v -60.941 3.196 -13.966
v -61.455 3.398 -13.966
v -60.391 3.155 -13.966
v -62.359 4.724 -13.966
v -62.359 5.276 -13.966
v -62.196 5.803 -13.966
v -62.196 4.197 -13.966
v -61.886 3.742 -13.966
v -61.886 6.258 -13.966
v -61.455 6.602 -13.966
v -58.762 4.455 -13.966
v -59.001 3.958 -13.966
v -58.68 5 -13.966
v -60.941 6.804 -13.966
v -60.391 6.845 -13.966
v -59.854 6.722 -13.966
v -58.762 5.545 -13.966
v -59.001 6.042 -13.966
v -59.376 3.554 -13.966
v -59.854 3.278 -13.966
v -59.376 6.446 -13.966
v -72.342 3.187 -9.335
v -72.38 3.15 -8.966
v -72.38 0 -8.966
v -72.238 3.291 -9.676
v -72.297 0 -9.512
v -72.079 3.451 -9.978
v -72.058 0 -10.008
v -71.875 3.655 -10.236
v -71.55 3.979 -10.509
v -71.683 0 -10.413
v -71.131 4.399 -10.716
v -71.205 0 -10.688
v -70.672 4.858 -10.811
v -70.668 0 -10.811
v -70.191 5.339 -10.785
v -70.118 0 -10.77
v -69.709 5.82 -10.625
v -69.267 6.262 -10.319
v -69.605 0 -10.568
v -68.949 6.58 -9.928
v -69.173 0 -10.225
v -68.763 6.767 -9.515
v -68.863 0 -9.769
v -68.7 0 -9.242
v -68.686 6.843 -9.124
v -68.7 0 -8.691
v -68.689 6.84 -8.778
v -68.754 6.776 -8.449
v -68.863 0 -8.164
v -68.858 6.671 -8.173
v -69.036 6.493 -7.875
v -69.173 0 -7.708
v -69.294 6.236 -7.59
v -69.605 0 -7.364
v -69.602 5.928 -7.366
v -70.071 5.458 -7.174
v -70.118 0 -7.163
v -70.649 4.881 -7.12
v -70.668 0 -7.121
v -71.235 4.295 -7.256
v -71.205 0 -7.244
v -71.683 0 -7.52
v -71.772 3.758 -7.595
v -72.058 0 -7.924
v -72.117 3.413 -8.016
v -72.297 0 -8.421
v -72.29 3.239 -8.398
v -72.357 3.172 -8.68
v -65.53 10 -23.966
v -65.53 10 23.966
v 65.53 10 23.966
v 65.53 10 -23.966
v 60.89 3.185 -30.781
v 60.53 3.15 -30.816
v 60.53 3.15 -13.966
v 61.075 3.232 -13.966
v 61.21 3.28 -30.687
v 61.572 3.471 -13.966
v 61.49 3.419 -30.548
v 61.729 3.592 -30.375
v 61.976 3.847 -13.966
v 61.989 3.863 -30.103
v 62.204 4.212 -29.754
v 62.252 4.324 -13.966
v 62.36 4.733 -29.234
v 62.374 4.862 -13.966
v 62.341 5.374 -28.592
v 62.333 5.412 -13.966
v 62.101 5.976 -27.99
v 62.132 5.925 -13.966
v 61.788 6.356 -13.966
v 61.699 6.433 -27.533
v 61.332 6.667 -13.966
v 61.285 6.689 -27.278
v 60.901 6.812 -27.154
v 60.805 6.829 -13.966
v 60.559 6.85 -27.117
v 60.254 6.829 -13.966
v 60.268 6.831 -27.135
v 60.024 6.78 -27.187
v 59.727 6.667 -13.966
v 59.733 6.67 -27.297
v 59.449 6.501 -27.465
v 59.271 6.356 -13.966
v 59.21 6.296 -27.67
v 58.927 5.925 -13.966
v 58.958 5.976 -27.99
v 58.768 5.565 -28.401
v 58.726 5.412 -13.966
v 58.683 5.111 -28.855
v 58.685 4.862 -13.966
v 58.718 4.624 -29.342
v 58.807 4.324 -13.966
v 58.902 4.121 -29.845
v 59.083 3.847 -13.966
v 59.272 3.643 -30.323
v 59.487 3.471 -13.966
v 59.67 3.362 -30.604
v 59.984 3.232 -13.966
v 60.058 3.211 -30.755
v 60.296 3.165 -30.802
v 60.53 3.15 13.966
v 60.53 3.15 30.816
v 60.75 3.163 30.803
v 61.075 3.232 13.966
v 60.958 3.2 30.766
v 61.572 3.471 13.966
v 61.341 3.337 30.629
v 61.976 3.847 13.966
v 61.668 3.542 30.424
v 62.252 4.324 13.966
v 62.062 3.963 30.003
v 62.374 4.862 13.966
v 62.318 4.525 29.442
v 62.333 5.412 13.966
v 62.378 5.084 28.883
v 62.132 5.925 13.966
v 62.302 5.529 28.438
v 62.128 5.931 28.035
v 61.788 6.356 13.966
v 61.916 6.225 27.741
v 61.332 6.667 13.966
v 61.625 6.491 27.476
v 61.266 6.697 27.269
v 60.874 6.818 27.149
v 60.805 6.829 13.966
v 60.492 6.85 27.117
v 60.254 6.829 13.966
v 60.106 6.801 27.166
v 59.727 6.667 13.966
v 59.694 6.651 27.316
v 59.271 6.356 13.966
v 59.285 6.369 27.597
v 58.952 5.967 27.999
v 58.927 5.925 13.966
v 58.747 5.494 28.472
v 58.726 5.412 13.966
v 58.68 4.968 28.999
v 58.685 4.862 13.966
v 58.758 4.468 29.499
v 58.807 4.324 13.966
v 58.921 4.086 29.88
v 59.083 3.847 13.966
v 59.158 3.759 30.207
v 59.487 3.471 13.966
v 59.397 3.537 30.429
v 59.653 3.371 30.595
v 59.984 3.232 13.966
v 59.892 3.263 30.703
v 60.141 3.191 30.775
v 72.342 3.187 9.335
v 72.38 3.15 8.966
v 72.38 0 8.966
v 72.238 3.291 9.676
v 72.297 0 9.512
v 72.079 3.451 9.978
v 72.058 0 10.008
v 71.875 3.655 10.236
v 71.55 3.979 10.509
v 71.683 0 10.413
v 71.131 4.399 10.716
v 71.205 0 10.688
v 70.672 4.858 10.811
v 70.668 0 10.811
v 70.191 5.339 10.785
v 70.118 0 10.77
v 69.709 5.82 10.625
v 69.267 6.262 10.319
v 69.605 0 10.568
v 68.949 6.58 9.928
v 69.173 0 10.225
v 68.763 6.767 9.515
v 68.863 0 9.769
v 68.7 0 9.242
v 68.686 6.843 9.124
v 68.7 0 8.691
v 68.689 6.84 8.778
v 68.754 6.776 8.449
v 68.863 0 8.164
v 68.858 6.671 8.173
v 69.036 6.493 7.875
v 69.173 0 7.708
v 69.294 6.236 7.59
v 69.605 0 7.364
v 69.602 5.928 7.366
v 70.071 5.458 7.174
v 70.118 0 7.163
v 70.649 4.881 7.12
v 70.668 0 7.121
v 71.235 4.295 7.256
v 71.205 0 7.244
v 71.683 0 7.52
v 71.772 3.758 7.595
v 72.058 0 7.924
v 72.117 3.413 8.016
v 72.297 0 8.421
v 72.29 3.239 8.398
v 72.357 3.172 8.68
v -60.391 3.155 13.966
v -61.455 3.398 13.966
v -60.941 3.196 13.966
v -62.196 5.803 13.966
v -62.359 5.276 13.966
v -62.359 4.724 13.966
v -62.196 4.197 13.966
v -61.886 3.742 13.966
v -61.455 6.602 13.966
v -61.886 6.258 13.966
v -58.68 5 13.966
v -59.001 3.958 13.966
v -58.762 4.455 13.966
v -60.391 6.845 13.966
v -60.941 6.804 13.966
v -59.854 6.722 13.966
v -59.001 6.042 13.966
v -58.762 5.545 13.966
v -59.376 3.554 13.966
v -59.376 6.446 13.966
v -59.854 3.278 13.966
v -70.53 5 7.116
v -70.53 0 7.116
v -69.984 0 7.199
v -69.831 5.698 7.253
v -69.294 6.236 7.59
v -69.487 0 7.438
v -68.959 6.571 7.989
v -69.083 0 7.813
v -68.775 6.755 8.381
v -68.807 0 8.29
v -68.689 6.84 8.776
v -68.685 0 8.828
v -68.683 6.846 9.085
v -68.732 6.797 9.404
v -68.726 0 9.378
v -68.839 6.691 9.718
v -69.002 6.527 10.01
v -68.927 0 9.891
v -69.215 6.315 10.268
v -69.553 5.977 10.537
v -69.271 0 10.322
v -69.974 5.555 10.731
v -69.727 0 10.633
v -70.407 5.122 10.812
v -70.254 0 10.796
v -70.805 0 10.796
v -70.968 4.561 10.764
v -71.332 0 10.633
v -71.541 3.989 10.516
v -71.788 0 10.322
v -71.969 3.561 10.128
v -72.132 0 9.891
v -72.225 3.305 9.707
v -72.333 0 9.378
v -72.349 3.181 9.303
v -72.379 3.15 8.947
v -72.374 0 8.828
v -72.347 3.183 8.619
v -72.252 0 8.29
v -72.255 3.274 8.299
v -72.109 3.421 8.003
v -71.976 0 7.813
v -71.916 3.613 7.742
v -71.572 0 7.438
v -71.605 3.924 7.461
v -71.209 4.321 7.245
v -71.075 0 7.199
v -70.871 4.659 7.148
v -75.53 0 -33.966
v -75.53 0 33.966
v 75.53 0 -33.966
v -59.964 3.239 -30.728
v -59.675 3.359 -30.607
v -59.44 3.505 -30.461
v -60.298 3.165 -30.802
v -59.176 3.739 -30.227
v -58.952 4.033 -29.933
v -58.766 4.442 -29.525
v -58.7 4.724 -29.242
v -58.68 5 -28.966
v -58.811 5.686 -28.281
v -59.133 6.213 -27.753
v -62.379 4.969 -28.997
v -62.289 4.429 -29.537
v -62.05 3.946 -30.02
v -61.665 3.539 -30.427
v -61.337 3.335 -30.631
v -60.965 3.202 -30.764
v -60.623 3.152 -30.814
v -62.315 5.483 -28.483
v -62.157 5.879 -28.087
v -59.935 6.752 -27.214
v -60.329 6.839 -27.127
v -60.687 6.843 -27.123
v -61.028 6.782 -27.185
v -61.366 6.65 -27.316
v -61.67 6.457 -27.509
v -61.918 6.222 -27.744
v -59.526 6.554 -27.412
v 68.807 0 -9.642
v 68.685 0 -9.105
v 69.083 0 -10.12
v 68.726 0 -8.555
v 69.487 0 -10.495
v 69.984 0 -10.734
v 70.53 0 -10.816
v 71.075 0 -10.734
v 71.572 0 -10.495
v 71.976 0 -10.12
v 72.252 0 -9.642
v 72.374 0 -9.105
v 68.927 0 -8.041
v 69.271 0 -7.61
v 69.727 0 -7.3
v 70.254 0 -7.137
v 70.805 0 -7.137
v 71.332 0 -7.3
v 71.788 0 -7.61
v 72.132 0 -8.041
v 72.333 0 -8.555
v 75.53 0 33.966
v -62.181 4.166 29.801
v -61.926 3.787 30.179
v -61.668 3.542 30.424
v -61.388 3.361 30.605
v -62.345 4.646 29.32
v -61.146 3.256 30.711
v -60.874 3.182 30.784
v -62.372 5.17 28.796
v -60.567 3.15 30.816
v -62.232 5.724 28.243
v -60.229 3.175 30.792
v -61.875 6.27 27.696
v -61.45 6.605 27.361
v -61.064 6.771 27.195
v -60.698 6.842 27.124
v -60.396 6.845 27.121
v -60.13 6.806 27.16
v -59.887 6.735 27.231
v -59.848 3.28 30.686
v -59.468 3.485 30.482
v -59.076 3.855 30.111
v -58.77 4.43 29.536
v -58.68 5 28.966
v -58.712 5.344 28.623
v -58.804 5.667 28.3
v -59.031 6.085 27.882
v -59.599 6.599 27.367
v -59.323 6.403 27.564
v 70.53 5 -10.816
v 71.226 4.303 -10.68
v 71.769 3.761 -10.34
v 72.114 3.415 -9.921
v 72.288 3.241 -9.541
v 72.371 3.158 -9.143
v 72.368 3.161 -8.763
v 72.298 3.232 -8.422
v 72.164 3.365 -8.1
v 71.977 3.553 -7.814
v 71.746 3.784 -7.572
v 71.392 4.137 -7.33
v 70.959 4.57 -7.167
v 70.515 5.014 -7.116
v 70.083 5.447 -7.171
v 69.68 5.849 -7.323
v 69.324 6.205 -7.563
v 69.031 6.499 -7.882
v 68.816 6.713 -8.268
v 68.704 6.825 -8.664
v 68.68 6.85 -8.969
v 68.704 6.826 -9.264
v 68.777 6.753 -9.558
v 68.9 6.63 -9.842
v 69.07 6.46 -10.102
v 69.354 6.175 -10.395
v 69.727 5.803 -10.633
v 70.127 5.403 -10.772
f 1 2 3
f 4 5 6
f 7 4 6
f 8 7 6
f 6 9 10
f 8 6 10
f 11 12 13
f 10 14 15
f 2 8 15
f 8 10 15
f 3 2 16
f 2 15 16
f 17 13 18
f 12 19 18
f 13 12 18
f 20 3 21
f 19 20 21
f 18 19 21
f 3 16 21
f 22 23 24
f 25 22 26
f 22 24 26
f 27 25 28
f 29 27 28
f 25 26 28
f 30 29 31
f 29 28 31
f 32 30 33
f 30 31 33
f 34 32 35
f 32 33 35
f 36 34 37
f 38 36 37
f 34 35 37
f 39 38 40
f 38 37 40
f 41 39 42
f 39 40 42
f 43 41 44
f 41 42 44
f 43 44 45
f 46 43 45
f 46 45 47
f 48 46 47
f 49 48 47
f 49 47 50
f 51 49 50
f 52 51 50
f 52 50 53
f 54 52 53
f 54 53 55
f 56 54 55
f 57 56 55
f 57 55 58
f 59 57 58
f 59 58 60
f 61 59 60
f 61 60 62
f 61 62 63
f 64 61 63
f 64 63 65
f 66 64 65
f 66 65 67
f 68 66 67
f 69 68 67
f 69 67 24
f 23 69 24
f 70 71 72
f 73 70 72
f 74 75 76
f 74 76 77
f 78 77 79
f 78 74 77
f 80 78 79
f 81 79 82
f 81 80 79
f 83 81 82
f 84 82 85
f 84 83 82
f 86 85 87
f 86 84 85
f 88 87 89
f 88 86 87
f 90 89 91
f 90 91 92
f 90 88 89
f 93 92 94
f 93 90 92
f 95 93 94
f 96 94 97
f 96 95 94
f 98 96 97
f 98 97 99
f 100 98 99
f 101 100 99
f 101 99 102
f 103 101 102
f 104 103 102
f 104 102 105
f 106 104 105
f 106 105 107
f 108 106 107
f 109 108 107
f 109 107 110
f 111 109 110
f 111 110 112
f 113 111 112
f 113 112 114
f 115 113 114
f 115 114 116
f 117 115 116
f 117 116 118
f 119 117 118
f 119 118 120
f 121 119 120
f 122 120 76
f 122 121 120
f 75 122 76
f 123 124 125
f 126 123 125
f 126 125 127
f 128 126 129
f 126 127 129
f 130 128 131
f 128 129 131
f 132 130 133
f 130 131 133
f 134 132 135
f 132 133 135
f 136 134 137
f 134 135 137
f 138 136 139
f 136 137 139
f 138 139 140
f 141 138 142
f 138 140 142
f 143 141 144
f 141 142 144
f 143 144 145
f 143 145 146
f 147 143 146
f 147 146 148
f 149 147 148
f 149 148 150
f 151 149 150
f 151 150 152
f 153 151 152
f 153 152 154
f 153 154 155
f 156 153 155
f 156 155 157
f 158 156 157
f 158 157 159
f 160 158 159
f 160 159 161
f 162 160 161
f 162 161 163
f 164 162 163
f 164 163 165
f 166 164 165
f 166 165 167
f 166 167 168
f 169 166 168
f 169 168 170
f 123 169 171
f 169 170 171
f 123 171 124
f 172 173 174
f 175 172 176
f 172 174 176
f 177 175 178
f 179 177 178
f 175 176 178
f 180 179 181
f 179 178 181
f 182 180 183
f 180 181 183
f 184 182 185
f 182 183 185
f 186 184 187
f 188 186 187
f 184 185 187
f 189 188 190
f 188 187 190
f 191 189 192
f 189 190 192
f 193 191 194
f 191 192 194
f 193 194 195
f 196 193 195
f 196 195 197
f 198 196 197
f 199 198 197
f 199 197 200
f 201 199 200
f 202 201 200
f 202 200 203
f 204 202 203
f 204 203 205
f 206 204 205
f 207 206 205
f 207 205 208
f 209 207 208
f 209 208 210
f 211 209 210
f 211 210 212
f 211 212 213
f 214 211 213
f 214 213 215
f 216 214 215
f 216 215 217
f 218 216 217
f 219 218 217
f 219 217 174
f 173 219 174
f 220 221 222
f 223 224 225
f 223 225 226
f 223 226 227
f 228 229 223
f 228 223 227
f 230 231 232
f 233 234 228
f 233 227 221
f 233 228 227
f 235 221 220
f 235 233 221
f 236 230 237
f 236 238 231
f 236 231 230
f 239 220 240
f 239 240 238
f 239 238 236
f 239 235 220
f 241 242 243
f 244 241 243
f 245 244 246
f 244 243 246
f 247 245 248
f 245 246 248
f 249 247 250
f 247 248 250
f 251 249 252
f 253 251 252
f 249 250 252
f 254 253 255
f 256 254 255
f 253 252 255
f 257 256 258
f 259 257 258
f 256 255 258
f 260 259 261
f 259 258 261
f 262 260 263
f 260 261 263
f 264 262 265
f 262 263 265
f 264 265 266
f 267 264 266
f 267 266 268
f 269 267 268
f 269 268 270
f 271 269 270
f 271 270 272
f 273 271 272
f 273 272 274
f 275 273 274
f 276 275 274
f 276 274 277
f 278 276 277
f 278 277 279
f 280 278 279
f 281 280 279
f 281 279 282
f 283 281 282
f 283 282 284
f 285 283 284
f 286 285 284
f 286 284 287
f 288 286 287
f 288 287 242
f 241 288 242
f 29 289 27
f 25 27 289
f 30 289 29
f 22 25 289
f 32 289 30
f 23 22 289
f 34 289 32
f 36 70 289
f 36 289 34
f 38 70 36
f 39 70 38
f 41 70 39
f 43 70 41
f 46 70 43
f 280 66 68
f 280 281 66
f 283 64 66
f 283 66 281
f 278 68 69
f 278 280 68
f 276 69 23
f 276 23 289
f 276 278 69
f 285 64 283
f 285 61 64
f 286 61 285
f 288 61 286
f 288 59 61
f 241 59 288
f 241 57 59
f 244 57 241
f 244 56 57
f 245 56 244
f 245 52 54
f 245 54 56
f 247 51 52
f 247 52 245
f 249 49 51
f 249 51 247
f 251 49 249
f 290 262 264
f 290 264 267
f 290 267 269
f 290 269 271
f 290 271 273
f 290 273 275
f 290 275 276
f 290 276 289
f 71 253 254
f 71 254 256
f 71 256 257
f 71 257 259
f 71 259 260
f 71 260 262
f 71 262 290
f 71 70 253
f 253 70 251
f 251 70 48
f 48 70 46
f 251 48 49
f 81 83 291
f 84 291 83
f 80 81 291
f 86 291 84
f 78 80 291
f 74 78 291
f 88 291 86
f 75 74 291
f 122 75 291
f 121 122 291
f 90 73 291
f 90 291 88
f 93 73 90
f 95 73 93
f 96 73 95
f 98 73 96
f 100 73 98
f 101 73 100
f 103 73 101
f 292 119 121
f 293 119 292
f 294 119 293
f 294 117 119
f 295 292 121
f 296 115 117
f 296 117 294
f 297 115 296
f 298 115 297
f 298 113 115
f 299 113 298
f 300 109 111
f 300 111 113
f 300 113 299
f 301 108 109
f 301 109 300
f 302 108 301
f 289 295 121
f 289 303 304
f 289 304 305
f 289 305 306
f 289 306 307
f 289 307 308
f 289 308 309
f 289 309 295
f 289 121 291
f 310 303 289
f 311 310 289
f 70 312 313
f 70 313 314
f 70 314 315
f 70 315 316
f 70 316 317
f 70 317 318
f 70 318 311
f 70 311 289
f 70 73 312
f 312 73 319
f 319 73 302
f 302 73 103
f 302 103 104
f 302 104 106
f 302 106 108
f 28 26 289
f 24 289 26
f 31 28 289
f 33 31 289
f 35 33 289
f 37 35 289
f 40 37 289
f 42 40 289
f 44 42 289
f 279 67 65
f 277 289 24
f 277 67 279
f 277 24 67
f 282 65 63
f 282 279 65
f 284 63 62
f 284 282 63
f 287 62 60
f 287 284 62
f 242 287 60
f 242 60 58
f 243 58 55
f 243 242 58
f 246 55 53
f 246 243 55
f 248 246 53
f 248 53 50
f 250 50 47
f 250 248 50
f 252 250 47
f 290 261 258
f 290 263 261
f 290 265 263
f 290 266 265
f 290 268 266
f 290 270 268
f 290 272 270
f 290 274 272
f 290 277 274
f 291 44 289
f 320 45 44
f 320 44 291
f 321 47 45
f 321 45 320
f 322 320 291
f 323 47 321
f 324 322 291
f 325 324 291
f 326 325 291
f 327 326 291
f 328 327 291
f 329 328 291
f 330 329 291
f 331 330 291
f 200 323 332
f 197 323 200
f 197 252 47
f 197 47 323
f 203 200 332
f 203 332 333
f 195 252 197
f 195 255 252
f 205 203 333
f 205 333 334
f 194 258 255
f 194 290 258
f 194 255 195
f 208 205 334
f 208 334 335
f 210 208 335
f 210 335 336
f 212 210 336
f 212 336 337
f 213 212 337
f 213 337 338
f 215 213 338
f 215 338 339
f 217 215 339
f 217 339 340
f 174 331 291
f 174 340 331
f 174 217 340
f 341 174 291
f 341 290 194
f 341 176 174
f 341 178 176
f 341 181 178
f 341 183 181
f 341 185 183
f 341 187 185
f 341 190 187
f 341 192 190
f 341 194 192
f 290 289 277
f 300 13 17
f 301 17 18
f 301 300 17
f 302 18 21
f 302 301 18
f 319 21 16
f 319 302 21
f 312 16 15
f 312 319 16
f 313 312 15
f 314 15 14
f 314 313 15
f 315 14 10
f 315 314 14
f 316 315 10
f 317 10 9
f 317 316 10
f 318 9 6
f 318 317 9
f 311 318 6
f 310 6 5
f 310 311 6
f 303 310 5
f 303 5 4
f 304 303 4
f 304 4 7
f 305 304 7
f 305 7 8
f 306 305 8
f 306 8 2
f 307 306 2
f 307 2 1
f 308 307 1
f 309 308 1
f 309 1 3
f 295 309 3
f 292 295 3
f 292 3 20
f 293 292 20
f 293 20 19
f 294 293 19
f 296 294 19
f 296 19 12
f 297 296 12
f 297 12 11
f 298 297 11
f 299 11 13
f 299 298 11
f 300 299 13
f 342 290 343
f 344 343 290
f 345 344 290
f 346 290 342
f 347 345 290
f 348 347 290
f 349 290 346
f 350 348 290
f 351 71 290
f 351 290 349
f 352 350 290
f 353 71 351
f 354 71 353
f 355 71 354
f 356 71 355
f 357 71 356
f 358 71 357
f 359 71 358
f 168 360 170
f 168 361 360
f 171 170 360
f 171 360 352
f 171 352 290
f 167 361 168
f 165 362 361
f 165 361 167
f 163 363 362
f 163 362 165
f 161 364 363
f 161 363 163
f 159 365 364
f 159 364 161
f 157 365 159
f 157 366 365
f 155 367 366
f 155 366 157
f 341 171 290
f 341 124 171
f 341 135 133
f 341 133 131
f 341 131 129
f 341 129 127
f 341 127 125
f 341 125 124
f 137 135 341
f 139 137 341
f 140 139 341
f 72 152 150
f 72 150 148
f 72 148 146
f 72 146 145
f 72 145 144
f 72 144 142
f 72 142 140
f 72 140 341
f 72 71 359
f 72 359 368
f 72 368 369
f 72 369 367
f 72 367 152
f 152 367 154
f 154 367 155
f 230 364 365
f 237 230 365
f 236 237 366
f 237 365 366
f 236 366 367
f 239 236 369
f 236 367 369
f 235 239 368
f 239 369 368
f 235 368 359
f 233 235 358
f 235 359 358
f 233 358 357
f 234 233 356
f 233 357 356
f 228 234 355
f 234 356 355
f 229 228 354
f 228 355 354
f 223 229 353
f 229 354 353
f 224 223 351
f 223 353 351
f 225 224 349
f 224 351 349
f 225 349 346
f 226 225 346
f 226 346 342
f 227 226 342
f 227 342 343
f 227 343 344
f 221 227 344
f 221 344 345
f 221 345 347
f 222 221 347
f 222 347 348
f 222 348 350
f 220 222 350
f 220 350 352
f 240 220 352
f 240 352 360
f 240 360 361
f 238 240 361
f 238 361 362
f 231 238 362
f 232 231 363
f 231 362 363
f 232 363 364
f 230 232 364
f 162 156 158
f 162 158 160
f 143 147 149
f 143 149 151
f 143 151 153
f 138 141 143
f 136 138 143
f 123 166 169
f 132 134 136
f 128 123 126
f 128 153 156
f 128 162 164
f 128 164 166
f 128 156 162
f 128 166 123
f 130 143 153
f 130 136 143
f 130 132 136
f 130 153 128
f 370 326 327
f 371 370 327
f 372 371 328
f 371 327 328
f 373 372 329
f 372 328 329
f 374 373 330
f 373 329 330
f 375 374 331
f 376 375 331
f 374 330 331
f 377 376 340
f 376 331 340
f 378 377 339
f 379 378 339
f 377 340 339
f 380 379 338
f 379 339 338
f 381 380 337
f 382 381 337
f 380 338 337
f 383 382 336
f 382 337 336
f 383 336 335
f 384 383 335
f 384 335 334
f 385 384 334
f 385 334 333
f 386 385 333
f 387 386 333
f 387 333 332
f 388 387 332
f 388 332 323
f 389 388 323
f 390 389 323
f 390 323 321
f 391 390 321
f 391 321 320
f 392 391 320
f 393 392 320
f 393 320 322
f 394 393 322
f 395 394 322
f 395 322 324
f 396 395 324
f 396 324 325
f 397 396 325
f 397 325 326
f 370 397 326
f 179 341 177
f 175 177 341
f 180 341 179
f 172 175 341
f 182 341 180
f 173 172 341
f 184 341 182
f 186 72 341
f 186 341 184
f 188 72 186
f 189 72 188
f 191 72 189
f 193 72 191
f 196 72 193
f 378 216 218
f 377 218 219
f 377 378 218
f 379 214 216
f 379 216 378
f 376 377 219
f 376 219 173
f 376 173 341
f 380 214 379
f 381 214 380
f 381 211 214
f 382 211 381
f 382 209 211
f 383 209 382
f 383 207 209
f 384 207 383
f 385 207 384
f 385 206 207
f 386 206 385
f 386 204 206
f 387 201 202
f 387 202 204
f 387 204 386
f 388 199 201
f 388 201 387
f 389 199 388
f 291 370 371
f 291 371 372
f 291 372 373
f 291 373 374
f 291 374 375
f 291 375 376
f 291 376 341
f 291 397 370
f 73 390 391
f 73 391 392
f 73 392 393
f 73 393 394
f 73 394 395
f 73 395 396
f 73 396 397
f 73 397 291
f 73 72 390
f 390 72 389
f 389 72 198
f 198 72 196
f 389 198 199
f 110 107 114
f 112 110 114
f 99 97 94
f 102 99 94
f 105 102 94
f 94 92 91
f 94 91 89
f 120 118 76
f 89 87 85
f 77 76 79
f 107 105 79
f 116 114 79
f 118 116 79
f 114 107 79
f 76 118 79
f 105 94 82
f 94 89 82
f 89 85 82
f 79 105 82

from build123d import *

# Parameters (mm, degrees)
SKETCH_4_R          = 1.85
CUT_EXTRUDE_1_DEPTH = 20
SKETCH_5_R          = 1.85
CUT_EXTRUDE_2_DEPTH = 84.417206125


with BuildPart() as part:
    # Эскиз1 → По сечениям1 section 0
    with BuildSketch(Plane(origin=(0, 0, 0), x_dir=(1, 0, 0), z_dir=(0, 1, 0))):
        with BuildLine():
            Line((-75.529594285, -33.966316269), (75.529594285, -33.966316269))
            Line((75.529594285, -33.966316269), (75.529594285, 33.966316269))
            Line((75.529594285, 33.966316269), (-75.529594285, 33.966316269))
            Line((-75.529594285, 33.966316269), (-75.529594285, -33.966316269))
        make_face()
    # Эскиз2 → По сечениям1 section 1
    with BuildSketch(Plane(origin=(0, 10, 0), x_dir=(1, 0, 0), z_dir=(0, 1, 0))):
        with BuildLine():
            Line((65.529594285, -23.966316269), (65.529594285, 23.966316269))
            Line((65.529594285, 23.966316269), (-65.529594285, 23.966316269))
            Line((-65.529594285, 23.966316269), (-65.529594285, -23.966316269))
            Line((-65.529594285, -23.966316269), (65.529594285, -23.966316269))
        make_face()
    loft()

    # Эскиз4 → Вырез-Вытянуть1 (cut)
    with BuildSketch(Plane.XY.offset(33.966316269)):
        with Locations((-60.529594285, 5)):
            Circle(SKETCH_4_R)
        with Locations(Location((60.529594285, 5, 0), (0, 0, 270))):
            Circle(SKETCH_4_R)
    cut_extrude_1 = extrude(amount=-CUT_EXTRUDE_1_DEPTH, mode=Mode.SUBTRACT)

    # Зеркальное отражение1: Вырез-Вытянуть1 across plane
    add(cut_extrude_1.mirror(Plane.XY), mode=Mode.SUBTRACT)

    # Эскиз5 → Вырез-Вытянуть2 (cut, through all)
    with BuildSketch(Plane.XZ):
        with Locations(Location((-70.529594285, 8.966316269, 0), (0, 0, 270))):
            Circle(SKETCH_5_R)
        with Locations(Location((-70.529594285, -8.966316269, 0), (0, 0, 180))):
            Circle(SKETCH_5_R)
        with Locations(Location((70.529594285, -8.966316269, 0), (0, 0, 270))):
            Circle(SKETCH_5_R)
        with Locations((70.529594285, 8.966316269)):
            Circle(SKETCH_5_R)
    extrude(amount=-CUT_EXTRUDE_2_DEPTH, mode=Mode.SUBTRACT)


solid = part.part
